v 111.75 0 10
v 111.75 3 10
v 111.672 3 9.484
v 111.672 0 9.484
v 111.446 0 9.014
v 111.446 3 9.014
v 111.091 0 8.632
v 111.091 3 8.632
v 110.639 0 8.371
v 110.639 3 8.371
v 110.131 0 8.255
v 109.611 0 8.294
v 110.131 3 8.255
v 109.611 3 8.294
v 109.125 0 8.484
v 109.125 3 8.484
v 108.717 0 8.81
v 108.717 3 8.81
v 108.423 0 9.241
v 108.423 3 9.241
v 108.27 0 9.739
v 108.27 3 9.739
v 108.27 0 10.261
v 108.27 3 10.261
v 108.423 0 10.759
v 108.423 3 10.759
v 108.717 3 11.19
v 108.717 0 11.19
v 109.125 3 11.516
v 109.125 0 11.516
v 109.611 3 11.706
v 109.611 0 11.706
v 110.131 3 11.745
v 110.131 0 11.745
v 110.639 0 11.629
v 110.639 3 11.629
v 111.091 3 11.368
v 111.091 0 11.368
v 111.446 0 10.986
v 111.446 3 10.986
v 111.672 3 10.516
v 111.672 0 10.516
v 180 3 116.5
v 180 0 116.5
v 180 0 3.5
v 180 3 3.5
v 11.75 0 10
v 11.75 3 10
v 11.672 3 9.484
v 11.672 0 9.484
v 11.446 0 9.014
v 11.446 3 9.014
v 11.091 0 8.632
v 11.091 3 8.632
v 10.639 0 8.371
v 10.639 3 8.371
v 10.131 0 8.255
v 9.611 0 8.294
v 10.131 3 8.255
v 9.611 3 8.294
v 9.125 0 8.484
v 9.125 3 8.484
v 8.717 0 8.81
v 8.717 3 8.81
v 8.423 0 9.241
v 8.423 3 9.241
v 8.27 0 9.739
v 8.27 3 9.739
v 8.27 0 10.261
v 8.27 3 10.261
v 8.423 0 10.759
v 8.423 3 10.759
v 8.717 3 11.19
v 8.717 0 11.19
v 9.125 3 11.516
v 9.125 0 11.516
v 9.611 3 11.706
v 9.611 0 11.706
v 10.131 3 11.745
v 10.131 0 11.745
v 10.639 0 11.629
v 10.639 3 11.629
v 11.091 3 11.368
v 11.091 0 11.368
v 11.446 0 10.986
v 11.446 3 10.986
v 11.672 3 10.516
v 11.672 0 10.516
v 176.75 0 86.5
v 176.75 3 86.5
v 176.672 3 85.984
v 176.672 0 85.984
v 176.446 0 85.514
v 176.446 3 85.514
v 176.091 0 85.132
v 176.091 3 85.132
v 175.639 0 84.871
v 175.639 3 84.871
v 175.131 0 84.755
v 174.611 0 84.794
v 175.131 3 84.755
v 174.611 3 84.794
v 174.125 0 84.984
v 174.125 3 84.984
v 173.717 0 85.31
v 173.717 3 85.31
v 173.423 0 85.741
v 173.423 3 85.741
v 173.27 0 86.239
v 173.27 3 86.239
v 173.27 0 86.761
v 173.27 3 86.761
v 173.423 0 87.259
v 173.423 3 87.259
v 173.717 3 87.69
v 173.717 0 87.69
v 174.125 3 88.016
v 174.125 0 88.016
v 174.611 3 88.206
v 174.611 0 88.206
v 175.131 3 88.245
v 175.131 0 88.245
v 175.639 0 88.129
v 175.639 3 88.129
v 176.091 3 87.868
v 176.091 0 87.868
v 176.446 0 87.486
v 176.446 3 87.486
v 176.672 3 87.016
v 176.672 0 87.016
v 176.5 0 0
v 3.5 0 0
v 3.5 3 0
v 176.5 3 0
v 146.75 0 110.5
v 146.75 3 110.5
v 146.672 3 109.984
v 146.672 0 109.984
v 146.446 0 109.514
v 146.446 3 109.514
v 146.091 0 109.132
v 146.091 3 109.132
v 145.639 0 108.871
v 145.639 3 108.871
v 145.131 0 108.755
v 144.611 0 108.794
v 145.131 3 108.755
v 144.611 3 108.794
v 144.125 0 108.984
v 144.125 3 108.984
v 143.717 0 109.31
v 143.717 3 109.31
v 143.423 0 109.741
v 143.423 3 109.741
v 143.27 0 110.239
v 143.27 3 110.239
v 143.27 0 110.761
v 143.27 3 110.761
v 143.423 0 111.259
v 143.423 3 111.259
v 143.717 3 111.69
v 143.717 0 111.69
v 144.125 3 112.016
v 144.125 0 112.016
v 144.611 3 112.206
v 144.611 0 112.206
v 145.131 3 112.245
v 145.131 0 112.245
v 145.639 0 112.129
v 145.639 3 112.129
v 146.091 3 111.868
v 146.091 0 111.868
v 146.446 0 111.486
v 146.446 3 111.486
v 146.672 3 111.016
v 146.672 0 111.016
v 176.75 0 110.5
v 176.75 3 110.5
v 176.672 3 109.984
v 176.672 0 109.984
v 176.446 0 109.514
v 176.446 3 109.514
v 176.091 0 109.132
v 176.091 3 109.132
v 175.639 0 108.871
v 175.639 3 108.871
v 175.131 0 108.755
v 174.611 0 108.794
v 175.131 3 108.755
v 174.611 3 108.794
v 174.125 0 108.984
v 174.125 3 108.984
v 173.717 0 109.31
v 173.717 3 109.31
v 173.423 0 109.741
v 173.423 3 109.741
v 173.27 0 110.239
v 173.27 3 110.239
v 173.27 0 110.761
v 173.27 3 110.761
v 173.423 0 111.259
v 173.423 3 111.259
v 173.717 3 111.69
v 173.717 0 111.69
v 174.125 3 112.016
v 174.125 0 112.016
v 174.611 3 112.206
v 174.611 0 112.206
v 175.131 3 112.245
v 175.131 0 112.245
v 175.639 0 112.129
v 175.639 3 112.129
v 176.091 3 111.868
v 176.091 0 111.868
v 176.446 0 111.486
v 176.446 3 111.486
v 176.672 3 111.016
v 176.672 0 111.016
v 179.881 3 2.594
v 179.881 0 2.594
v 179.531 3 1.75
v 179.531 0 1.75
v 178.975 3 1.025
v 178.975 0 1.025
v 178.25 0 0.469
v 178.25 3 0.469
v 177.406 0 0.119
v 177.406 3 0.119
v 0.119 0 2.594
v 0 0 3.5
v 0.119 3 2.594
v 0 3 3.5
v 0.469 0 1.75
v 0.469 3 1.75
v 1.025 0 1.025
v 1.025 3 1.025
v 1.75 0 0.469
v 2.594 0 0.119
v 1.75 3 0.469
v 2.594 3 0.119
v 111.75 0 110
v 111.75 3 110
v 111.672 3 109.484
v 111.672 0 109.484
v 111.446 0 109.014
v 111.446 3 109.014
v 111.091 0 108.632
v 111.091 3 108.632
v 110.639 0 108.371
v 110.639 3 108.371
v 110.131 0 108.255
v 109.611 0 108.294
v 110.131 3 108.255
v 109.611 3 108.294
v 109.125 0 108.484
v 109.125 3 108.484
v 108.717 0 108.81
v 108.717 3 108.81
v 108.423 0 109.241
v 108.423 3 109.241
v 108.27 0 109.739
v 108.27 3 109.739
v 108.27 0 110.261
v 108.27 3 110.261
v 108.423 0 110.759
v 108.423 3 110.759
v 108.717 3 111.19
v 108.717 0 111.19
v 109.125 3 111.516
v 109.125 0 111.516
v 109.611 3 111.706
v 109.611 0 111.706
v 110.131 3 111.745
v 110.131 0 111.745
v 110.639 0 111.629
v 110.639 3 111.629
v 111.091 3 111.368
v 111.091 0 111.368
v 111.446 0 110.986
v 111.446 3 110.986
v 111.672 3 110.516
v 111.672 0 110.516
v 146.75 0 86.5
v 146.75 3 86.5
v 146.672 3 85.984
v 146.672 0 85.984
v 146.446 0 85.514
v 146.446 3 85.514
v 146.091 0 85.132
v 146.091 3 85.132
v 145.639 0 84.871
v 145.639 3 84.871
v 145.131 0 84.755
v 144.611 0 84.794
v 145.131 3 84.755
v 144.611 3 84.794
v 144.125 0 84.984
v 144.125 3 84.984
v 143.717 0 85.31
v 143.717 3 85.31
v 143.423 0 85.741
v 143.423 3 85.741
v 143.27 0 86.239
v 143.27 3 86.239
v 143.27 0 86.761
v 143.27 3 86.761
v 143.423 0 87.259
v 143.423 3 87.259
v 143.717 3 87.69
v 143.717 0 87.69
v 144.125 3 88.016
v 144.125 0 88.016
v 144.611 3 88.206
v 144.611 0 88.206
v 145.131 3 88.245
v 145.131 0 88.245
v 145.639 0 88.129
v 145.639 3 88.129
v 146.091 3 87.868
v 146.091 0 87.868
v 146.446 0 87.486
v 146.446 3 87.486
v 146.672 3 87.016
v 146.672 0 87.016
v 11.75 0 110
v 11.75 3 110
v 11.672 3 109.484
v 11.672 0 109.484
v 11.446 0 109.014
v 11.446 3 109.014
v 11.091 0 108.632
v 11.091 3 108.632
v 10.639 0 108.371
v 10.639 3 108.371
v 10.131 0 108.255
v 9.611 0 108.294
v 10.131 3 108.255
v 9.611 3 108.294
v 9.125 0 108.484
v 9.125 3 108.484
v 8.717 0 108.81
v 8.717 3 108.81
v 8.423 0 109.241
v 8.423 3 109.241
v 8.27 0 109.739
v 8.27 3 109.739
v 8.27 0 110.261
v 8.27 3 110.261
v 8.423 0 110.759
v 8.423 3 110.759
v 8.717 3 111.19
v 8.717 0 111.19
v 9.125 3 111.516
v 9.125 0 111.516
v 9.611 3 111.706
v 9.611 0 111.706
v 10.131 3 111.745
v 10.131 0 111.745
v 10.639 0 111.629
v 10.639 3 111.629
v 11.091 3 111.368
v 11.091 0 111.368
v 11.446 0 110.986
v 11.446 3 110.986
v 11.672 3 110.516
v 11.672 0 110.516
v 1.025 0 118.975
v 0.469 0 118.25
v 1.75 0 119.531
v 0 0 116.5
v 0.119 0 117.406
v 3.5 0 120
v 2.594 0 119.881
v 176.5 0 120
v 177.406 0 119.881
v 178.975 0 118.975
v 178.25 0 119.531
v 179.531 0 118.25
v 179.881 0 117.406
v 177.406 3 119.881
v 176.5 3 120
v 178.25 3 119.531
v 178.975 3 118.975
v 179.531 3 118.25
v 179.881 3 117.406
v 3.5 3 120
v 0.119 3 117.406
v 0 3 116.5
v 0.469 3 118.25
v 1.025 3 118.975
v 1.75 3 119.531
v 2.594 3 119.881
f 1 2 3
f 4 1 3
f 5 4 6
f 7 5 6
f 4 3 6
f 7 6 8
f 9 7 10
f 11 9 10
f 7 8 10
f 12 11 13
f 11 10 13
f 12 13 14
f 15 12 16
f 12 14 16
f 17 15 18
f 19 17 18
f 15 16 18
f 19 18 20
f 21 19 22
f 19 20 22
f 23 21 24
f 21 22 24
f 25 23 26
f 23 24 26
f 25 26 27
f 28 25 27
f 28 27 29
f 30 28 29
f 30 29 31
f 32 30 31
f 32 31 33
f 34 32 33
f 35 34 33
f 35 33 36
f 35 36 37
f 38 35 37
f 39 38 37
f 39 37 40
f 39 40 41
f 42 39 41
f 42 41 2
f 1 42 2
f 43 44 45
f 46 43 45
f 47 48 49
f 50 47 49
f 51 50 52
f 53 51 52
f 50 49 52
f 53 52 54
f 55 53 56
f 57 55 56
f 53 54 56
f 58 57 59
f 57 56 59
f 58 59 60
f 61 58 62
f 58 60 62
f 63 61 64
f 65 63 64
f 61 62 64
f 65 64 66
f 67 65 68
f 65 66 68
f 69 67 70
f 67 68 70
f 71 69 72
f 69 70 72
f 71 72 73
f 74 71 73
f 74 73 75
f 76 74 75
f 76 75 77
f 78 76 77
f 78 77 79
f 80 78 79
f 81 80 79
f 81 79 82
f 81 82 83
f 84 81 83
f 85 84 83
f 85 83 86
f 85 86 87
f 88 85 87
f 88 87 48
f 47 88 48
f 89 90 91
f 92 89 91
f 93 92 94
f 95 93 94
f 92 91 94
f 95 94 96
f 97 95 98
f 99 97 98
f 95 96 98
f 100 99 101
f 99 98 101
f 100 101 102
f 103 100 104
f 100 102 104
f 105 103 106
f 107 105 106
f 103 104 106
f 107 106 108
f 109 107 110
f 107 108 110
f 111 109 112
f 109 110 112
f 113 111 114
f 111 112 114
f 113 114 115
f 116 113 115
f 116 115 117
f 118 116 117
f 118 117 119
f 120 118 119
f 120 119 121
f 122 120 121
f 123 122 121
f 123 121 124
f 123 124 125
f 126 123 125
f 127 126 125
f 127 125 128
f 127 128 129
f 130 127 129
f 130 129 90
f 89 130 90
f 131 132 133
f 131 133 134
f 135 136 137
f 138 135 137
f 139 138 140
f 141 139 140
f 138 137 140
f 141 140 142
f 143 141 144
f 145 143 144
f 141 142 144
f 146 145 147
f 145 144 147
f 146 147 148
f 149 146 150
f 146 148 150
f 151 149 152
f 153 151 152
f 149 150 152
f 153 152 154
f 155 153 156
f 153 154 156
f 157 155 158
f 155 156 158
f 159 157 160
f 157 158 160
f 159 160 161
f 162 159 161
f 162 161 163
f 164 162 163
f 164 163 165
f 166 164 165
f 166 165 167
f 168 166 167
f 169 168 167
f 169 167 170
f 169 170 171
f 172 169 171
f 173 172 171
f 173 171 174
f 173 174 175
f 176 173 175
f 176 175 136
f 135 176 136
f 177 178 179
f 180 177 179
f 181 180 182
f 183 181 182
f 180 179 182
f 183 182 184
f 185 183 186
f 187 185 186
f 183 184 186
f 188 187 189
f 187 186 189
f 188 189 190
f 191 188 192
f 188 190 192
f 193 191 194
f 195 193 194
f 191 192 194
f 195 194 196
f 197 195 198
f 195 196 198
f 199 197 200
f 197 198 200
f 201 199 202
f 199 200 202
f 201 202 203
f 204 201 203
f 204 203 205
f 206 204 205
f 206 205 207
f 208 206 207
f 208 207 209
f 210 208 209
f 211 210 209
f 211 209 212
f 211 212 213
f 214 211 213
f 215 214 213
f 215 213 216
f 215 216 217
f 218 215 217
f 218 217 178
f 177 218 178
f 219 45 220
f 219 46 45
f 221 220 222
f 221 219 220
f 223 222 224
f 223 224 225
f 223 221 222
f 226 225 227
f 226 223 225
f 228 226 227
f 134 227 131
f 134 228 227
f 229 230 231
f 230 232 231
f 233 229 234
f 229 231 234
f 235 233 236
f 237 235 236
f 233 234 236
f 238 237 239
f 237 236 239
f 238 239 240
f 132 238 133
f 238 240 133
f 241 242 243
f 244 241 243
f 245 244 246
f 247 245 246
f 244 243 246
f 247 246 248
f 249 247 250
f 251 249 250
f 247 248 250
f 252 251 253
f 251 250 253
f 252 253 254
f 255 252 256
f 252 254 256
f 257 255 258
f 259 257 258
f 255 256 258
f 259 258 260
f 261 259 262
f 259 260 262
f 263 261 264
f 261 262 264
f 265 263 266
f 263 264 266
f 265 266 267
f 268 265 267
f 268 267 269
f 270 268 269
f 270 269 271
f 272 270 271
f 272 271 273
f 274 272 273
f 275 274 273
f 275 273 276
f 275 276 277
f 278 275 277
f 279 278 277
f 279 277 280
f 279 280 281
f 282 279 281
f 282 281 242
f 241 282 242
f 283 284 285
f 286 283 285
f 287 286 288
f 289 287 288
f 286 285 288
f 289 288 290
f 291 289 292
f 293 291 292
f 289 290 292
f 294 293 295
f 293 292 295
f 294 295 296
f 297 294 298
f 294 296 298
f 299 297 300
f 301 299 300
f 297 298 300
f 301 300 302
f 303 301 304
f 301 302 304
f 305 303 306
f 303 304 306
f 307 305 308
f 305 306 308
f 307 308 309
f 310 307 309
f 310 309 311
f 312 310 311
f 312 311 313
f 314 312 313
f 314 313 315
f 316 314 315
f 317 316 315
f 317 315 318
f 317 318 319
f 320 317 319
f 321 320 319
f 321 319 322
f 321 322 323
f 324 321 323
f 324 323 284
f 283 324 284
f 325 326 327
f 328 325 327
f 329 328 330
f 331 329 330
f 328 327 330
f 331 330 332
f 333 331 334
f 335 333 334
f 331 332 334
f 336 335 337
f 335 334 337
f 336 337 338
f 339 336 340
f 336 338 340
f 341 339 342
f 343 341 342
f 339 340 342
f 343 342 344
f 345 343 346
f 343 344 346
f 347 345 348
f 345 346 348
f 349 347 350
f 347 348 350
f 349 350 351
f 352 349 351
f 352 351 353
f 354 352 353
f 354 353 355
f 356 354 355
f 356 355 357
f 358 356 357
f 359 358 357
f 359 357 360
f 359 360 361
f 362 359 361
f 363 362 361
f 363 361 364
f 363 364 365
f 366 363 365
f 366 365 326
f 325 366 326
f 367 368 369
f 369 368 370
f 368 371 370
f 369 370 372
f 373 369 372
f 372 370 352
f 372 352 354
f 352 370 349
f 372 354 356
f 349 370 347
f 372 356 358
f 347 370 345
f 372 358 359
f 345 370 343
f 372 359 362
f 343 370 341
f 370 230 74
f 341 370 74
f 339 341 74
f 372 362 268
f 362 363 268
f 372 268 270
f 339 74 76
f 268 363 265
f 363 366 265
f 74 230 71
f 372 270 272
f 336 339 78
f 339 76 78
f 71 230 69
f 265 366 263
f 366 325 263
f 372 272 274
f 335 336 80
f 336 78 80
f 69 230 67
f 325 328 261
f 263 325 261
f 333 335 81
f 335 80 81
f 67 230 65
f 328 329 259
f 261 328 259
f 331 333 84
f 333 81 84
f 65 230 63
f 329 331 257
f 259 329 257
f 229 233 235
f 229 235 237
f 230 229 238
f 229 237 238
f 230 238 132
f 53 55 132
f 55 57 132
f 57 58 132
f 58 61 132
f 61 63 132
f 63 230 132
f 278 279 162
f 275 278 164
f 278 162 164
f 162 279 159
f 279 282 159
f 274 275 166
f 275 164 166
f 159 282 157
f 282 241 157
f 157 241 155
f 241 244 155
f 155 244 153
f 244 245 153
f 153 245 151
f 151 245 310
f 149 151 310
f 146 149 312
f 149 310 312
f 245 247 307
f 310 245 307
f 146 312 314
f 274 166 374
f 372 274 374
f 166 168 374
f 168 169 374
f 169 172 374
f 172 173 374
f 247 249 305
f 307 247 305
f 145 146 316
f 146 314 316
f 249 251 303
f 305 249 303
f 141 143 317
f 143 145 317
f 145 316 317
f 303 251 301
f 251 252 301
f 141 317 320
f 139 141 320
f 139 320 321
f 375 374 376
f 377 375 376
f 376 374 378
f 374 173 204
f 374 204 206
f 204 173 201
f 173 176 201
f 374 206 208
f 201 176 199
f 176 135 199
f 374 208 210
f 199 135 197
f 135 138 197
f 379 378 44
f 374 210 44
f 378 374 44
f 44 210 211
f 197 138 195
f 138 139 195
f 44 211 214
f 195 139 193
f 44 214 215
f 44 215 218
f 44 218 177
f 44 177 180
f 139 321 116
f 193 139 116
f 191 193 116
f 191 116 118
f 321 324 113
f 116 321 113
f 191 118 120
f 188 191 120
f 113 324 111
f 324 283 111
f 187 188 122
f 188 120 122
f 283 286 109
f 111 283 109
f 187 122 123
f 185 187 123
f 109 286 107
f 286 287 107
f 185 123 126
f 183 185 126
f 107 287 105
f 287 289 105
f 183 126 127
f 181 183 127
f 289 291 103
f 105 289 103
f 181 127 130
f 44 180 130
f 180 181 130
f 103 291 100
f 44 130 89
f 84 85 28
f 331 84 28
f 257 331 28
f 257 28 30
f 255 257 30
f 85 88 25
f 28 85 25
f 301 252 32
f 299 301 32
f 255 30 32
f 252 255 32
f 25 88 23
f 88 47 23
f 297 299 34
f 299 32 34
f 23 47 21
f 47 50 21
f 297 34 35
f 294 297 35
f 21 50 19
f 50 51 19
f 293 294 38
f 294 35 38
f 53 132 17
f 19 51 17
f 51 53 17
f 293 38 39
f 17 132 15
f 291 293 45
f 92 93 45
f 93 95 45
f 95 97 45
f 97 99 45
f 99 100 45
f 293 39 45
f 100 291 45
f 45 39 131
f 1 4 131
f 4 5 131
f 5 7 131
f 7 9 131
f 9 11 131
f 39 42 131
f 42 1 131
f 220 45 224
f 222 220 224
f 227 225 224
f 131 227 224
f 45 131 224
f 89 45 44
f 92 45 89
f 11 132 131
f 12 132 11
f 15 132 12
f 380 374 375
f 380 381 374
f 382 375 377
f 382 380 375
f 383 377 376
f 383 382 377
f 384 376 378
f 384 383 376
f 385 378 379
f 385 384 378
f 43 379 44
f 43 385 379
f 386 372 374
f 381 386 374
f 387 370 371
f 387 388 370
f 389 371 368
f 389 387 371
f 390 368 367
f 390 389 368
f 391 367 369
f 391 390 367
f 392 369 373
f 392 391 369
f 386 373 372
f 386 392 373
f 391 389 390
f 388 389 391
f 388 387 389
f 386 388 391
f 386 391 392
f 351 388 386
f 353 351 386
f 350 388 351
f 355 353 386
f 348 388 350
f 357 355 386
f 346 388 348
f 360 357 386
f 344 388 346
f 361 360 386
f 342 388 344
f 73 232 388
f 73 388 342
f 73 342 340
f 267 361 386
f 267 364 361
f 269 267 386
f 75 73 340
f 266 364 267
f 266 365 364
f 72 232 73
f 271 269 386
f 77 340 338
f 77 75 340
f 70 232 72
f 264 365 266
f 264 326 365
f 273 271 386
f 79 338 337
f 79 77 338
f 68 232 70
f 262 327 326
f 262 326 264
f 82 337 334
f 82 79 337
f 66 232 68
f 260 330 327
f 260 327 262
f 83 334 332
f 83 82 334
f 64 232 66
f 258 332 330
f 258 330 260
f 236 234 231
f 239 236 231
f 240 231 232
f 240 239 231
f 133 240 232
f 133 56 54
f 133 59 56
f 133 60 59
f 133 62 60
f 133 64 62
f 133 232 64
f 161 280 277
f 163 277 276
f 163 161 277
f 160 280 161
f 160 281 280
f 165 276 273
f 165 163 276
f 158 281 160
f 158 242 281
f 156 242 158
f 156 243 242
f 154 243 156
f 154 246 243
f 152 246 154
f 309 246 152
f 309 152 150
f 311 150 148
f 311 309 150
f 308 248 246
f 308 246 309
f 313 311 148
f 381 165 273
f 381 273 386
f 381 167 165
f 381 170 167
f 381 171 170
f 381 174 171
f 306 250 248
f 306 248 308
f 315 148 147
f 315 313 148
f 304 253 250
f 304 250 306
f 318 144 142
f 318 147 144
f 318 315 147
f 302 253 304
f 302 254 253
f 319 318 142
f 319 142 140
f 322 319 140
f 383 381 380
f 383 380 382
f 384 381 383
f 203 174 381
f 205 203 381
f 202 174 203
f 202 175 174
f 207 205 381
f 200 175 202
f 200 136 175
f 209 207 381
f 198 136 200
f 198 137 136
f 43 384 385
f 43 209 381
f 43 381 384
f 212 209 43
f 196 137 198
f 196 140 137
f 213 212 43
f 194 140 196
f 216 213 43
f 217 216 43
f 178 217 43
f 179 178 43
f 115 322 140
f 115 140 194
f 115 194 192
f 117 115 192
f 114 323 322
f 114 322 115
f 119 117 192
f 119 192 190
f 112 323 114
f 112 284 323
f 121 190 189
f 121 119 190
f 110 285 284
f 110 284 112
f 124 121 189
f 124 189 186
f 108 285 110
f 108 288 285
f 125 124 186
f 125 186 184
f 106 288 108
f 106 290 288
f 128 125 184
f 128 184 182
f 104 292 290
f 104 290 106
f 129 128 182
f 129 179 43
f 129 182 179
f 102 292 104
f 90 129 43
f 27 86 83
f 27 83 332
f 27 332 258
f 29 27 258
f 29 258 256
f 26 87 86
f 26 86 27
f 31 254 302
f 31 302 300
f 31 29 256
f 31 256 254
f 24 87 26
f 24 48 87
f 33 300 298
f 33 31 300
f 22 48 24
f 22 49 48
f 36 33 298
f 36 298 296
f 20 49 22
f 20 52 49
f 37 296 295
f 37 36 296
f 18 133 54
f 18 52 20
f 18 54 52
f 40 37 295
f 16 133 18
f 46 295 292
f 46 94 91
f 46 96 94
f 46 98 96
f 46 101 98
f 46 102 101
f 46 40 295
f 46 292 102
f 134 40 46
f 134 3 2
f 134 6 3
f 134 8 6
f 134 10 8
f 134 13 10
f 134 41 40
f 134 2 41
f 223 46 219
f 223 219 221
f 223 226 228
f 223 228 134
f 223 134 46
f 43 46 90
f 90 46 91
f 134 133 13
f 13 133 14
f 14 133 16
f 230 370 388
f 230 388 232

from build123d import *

# Parameters (mm, degrees)
SKETCH_2_W          = 180
SKETCH_2_H          = 120
EXTRUDE_1_DEPTH     = 3
FILLET_1_R          = 3.5
SKETCH_3_R          = 1.75
CUT_EXTRUDE_1_DEPTH = 4
SKETCH_4_R          = 1.75
CUT_EXTRUDE_2_DEPTH = 4


with BuildPart() as part:
    # 草图2 → 凸台-拉伸1 (new body)
    with BuildSketch(Plane(origin=(0, 0, 0), x_dir=(1, 0, 0), z_dir=(0, 1, 0))):
        with Locations((90, -60)):
            Rectangle(SKETCH_2_W, SKETCH_2_H)
    extrude(amount=EXTRUDE_1_DEPTH)

    # 圆角1
    fillet_1_edges = [part.edges().sort_by_distance(p)[0] for p in [
        (0, 1.5, 0),
        (180, 1.5, 0),
        (180, 1.5, 120),
        (0, 1.5, 120),
    ]]
    fillet(fillet_1_edges, radius=FILLET_1_R)

    # 草图3 → 切除-拉伸1 (cut, through all)
    with BuildSketch(Plane(origin=(0, 3, 0), x_dir=(1, 0, 0), z_dir=(0, 1, 0))):
        with Locations((175, -110.5)):
            Circle(SKETCH_3_R)
        with Locations((145, -110.5)):
            Circle(SKETCH_3_R)
        with Locations((175, -86.5)):
            Circle(SKETCH_3_R)
        with Locations((145, -86.5)):
            Circle(SKETCH_3_R)
    extrude(amount=-CUT_EXTRUDE_1_DEPTH, mode=Mode.SUBTRACT)

    # 草图4 → 切除-拉伸2 (cut, through all)
    with BuildSketch(Plane(origin=(0, 3, 0), x_dir=(1, 0, 0), z_dir=(0, 1, 0))):
        with Locations((110, -110)):
            Circle(SKETCH_4_R)
        with Locations((110, -10)):
            Circle(SKETCH_4_R)
        with Locations((10, -10)):
            Circle(SKETCH_4_R)
        with Locations((10, -110)):
            Circle(SKETCH_4_R)
    extrude(amount=-CUT_EXTRUDE_2_DEPTH, mode=Mode.SUBTRACT)


solid = part.part
